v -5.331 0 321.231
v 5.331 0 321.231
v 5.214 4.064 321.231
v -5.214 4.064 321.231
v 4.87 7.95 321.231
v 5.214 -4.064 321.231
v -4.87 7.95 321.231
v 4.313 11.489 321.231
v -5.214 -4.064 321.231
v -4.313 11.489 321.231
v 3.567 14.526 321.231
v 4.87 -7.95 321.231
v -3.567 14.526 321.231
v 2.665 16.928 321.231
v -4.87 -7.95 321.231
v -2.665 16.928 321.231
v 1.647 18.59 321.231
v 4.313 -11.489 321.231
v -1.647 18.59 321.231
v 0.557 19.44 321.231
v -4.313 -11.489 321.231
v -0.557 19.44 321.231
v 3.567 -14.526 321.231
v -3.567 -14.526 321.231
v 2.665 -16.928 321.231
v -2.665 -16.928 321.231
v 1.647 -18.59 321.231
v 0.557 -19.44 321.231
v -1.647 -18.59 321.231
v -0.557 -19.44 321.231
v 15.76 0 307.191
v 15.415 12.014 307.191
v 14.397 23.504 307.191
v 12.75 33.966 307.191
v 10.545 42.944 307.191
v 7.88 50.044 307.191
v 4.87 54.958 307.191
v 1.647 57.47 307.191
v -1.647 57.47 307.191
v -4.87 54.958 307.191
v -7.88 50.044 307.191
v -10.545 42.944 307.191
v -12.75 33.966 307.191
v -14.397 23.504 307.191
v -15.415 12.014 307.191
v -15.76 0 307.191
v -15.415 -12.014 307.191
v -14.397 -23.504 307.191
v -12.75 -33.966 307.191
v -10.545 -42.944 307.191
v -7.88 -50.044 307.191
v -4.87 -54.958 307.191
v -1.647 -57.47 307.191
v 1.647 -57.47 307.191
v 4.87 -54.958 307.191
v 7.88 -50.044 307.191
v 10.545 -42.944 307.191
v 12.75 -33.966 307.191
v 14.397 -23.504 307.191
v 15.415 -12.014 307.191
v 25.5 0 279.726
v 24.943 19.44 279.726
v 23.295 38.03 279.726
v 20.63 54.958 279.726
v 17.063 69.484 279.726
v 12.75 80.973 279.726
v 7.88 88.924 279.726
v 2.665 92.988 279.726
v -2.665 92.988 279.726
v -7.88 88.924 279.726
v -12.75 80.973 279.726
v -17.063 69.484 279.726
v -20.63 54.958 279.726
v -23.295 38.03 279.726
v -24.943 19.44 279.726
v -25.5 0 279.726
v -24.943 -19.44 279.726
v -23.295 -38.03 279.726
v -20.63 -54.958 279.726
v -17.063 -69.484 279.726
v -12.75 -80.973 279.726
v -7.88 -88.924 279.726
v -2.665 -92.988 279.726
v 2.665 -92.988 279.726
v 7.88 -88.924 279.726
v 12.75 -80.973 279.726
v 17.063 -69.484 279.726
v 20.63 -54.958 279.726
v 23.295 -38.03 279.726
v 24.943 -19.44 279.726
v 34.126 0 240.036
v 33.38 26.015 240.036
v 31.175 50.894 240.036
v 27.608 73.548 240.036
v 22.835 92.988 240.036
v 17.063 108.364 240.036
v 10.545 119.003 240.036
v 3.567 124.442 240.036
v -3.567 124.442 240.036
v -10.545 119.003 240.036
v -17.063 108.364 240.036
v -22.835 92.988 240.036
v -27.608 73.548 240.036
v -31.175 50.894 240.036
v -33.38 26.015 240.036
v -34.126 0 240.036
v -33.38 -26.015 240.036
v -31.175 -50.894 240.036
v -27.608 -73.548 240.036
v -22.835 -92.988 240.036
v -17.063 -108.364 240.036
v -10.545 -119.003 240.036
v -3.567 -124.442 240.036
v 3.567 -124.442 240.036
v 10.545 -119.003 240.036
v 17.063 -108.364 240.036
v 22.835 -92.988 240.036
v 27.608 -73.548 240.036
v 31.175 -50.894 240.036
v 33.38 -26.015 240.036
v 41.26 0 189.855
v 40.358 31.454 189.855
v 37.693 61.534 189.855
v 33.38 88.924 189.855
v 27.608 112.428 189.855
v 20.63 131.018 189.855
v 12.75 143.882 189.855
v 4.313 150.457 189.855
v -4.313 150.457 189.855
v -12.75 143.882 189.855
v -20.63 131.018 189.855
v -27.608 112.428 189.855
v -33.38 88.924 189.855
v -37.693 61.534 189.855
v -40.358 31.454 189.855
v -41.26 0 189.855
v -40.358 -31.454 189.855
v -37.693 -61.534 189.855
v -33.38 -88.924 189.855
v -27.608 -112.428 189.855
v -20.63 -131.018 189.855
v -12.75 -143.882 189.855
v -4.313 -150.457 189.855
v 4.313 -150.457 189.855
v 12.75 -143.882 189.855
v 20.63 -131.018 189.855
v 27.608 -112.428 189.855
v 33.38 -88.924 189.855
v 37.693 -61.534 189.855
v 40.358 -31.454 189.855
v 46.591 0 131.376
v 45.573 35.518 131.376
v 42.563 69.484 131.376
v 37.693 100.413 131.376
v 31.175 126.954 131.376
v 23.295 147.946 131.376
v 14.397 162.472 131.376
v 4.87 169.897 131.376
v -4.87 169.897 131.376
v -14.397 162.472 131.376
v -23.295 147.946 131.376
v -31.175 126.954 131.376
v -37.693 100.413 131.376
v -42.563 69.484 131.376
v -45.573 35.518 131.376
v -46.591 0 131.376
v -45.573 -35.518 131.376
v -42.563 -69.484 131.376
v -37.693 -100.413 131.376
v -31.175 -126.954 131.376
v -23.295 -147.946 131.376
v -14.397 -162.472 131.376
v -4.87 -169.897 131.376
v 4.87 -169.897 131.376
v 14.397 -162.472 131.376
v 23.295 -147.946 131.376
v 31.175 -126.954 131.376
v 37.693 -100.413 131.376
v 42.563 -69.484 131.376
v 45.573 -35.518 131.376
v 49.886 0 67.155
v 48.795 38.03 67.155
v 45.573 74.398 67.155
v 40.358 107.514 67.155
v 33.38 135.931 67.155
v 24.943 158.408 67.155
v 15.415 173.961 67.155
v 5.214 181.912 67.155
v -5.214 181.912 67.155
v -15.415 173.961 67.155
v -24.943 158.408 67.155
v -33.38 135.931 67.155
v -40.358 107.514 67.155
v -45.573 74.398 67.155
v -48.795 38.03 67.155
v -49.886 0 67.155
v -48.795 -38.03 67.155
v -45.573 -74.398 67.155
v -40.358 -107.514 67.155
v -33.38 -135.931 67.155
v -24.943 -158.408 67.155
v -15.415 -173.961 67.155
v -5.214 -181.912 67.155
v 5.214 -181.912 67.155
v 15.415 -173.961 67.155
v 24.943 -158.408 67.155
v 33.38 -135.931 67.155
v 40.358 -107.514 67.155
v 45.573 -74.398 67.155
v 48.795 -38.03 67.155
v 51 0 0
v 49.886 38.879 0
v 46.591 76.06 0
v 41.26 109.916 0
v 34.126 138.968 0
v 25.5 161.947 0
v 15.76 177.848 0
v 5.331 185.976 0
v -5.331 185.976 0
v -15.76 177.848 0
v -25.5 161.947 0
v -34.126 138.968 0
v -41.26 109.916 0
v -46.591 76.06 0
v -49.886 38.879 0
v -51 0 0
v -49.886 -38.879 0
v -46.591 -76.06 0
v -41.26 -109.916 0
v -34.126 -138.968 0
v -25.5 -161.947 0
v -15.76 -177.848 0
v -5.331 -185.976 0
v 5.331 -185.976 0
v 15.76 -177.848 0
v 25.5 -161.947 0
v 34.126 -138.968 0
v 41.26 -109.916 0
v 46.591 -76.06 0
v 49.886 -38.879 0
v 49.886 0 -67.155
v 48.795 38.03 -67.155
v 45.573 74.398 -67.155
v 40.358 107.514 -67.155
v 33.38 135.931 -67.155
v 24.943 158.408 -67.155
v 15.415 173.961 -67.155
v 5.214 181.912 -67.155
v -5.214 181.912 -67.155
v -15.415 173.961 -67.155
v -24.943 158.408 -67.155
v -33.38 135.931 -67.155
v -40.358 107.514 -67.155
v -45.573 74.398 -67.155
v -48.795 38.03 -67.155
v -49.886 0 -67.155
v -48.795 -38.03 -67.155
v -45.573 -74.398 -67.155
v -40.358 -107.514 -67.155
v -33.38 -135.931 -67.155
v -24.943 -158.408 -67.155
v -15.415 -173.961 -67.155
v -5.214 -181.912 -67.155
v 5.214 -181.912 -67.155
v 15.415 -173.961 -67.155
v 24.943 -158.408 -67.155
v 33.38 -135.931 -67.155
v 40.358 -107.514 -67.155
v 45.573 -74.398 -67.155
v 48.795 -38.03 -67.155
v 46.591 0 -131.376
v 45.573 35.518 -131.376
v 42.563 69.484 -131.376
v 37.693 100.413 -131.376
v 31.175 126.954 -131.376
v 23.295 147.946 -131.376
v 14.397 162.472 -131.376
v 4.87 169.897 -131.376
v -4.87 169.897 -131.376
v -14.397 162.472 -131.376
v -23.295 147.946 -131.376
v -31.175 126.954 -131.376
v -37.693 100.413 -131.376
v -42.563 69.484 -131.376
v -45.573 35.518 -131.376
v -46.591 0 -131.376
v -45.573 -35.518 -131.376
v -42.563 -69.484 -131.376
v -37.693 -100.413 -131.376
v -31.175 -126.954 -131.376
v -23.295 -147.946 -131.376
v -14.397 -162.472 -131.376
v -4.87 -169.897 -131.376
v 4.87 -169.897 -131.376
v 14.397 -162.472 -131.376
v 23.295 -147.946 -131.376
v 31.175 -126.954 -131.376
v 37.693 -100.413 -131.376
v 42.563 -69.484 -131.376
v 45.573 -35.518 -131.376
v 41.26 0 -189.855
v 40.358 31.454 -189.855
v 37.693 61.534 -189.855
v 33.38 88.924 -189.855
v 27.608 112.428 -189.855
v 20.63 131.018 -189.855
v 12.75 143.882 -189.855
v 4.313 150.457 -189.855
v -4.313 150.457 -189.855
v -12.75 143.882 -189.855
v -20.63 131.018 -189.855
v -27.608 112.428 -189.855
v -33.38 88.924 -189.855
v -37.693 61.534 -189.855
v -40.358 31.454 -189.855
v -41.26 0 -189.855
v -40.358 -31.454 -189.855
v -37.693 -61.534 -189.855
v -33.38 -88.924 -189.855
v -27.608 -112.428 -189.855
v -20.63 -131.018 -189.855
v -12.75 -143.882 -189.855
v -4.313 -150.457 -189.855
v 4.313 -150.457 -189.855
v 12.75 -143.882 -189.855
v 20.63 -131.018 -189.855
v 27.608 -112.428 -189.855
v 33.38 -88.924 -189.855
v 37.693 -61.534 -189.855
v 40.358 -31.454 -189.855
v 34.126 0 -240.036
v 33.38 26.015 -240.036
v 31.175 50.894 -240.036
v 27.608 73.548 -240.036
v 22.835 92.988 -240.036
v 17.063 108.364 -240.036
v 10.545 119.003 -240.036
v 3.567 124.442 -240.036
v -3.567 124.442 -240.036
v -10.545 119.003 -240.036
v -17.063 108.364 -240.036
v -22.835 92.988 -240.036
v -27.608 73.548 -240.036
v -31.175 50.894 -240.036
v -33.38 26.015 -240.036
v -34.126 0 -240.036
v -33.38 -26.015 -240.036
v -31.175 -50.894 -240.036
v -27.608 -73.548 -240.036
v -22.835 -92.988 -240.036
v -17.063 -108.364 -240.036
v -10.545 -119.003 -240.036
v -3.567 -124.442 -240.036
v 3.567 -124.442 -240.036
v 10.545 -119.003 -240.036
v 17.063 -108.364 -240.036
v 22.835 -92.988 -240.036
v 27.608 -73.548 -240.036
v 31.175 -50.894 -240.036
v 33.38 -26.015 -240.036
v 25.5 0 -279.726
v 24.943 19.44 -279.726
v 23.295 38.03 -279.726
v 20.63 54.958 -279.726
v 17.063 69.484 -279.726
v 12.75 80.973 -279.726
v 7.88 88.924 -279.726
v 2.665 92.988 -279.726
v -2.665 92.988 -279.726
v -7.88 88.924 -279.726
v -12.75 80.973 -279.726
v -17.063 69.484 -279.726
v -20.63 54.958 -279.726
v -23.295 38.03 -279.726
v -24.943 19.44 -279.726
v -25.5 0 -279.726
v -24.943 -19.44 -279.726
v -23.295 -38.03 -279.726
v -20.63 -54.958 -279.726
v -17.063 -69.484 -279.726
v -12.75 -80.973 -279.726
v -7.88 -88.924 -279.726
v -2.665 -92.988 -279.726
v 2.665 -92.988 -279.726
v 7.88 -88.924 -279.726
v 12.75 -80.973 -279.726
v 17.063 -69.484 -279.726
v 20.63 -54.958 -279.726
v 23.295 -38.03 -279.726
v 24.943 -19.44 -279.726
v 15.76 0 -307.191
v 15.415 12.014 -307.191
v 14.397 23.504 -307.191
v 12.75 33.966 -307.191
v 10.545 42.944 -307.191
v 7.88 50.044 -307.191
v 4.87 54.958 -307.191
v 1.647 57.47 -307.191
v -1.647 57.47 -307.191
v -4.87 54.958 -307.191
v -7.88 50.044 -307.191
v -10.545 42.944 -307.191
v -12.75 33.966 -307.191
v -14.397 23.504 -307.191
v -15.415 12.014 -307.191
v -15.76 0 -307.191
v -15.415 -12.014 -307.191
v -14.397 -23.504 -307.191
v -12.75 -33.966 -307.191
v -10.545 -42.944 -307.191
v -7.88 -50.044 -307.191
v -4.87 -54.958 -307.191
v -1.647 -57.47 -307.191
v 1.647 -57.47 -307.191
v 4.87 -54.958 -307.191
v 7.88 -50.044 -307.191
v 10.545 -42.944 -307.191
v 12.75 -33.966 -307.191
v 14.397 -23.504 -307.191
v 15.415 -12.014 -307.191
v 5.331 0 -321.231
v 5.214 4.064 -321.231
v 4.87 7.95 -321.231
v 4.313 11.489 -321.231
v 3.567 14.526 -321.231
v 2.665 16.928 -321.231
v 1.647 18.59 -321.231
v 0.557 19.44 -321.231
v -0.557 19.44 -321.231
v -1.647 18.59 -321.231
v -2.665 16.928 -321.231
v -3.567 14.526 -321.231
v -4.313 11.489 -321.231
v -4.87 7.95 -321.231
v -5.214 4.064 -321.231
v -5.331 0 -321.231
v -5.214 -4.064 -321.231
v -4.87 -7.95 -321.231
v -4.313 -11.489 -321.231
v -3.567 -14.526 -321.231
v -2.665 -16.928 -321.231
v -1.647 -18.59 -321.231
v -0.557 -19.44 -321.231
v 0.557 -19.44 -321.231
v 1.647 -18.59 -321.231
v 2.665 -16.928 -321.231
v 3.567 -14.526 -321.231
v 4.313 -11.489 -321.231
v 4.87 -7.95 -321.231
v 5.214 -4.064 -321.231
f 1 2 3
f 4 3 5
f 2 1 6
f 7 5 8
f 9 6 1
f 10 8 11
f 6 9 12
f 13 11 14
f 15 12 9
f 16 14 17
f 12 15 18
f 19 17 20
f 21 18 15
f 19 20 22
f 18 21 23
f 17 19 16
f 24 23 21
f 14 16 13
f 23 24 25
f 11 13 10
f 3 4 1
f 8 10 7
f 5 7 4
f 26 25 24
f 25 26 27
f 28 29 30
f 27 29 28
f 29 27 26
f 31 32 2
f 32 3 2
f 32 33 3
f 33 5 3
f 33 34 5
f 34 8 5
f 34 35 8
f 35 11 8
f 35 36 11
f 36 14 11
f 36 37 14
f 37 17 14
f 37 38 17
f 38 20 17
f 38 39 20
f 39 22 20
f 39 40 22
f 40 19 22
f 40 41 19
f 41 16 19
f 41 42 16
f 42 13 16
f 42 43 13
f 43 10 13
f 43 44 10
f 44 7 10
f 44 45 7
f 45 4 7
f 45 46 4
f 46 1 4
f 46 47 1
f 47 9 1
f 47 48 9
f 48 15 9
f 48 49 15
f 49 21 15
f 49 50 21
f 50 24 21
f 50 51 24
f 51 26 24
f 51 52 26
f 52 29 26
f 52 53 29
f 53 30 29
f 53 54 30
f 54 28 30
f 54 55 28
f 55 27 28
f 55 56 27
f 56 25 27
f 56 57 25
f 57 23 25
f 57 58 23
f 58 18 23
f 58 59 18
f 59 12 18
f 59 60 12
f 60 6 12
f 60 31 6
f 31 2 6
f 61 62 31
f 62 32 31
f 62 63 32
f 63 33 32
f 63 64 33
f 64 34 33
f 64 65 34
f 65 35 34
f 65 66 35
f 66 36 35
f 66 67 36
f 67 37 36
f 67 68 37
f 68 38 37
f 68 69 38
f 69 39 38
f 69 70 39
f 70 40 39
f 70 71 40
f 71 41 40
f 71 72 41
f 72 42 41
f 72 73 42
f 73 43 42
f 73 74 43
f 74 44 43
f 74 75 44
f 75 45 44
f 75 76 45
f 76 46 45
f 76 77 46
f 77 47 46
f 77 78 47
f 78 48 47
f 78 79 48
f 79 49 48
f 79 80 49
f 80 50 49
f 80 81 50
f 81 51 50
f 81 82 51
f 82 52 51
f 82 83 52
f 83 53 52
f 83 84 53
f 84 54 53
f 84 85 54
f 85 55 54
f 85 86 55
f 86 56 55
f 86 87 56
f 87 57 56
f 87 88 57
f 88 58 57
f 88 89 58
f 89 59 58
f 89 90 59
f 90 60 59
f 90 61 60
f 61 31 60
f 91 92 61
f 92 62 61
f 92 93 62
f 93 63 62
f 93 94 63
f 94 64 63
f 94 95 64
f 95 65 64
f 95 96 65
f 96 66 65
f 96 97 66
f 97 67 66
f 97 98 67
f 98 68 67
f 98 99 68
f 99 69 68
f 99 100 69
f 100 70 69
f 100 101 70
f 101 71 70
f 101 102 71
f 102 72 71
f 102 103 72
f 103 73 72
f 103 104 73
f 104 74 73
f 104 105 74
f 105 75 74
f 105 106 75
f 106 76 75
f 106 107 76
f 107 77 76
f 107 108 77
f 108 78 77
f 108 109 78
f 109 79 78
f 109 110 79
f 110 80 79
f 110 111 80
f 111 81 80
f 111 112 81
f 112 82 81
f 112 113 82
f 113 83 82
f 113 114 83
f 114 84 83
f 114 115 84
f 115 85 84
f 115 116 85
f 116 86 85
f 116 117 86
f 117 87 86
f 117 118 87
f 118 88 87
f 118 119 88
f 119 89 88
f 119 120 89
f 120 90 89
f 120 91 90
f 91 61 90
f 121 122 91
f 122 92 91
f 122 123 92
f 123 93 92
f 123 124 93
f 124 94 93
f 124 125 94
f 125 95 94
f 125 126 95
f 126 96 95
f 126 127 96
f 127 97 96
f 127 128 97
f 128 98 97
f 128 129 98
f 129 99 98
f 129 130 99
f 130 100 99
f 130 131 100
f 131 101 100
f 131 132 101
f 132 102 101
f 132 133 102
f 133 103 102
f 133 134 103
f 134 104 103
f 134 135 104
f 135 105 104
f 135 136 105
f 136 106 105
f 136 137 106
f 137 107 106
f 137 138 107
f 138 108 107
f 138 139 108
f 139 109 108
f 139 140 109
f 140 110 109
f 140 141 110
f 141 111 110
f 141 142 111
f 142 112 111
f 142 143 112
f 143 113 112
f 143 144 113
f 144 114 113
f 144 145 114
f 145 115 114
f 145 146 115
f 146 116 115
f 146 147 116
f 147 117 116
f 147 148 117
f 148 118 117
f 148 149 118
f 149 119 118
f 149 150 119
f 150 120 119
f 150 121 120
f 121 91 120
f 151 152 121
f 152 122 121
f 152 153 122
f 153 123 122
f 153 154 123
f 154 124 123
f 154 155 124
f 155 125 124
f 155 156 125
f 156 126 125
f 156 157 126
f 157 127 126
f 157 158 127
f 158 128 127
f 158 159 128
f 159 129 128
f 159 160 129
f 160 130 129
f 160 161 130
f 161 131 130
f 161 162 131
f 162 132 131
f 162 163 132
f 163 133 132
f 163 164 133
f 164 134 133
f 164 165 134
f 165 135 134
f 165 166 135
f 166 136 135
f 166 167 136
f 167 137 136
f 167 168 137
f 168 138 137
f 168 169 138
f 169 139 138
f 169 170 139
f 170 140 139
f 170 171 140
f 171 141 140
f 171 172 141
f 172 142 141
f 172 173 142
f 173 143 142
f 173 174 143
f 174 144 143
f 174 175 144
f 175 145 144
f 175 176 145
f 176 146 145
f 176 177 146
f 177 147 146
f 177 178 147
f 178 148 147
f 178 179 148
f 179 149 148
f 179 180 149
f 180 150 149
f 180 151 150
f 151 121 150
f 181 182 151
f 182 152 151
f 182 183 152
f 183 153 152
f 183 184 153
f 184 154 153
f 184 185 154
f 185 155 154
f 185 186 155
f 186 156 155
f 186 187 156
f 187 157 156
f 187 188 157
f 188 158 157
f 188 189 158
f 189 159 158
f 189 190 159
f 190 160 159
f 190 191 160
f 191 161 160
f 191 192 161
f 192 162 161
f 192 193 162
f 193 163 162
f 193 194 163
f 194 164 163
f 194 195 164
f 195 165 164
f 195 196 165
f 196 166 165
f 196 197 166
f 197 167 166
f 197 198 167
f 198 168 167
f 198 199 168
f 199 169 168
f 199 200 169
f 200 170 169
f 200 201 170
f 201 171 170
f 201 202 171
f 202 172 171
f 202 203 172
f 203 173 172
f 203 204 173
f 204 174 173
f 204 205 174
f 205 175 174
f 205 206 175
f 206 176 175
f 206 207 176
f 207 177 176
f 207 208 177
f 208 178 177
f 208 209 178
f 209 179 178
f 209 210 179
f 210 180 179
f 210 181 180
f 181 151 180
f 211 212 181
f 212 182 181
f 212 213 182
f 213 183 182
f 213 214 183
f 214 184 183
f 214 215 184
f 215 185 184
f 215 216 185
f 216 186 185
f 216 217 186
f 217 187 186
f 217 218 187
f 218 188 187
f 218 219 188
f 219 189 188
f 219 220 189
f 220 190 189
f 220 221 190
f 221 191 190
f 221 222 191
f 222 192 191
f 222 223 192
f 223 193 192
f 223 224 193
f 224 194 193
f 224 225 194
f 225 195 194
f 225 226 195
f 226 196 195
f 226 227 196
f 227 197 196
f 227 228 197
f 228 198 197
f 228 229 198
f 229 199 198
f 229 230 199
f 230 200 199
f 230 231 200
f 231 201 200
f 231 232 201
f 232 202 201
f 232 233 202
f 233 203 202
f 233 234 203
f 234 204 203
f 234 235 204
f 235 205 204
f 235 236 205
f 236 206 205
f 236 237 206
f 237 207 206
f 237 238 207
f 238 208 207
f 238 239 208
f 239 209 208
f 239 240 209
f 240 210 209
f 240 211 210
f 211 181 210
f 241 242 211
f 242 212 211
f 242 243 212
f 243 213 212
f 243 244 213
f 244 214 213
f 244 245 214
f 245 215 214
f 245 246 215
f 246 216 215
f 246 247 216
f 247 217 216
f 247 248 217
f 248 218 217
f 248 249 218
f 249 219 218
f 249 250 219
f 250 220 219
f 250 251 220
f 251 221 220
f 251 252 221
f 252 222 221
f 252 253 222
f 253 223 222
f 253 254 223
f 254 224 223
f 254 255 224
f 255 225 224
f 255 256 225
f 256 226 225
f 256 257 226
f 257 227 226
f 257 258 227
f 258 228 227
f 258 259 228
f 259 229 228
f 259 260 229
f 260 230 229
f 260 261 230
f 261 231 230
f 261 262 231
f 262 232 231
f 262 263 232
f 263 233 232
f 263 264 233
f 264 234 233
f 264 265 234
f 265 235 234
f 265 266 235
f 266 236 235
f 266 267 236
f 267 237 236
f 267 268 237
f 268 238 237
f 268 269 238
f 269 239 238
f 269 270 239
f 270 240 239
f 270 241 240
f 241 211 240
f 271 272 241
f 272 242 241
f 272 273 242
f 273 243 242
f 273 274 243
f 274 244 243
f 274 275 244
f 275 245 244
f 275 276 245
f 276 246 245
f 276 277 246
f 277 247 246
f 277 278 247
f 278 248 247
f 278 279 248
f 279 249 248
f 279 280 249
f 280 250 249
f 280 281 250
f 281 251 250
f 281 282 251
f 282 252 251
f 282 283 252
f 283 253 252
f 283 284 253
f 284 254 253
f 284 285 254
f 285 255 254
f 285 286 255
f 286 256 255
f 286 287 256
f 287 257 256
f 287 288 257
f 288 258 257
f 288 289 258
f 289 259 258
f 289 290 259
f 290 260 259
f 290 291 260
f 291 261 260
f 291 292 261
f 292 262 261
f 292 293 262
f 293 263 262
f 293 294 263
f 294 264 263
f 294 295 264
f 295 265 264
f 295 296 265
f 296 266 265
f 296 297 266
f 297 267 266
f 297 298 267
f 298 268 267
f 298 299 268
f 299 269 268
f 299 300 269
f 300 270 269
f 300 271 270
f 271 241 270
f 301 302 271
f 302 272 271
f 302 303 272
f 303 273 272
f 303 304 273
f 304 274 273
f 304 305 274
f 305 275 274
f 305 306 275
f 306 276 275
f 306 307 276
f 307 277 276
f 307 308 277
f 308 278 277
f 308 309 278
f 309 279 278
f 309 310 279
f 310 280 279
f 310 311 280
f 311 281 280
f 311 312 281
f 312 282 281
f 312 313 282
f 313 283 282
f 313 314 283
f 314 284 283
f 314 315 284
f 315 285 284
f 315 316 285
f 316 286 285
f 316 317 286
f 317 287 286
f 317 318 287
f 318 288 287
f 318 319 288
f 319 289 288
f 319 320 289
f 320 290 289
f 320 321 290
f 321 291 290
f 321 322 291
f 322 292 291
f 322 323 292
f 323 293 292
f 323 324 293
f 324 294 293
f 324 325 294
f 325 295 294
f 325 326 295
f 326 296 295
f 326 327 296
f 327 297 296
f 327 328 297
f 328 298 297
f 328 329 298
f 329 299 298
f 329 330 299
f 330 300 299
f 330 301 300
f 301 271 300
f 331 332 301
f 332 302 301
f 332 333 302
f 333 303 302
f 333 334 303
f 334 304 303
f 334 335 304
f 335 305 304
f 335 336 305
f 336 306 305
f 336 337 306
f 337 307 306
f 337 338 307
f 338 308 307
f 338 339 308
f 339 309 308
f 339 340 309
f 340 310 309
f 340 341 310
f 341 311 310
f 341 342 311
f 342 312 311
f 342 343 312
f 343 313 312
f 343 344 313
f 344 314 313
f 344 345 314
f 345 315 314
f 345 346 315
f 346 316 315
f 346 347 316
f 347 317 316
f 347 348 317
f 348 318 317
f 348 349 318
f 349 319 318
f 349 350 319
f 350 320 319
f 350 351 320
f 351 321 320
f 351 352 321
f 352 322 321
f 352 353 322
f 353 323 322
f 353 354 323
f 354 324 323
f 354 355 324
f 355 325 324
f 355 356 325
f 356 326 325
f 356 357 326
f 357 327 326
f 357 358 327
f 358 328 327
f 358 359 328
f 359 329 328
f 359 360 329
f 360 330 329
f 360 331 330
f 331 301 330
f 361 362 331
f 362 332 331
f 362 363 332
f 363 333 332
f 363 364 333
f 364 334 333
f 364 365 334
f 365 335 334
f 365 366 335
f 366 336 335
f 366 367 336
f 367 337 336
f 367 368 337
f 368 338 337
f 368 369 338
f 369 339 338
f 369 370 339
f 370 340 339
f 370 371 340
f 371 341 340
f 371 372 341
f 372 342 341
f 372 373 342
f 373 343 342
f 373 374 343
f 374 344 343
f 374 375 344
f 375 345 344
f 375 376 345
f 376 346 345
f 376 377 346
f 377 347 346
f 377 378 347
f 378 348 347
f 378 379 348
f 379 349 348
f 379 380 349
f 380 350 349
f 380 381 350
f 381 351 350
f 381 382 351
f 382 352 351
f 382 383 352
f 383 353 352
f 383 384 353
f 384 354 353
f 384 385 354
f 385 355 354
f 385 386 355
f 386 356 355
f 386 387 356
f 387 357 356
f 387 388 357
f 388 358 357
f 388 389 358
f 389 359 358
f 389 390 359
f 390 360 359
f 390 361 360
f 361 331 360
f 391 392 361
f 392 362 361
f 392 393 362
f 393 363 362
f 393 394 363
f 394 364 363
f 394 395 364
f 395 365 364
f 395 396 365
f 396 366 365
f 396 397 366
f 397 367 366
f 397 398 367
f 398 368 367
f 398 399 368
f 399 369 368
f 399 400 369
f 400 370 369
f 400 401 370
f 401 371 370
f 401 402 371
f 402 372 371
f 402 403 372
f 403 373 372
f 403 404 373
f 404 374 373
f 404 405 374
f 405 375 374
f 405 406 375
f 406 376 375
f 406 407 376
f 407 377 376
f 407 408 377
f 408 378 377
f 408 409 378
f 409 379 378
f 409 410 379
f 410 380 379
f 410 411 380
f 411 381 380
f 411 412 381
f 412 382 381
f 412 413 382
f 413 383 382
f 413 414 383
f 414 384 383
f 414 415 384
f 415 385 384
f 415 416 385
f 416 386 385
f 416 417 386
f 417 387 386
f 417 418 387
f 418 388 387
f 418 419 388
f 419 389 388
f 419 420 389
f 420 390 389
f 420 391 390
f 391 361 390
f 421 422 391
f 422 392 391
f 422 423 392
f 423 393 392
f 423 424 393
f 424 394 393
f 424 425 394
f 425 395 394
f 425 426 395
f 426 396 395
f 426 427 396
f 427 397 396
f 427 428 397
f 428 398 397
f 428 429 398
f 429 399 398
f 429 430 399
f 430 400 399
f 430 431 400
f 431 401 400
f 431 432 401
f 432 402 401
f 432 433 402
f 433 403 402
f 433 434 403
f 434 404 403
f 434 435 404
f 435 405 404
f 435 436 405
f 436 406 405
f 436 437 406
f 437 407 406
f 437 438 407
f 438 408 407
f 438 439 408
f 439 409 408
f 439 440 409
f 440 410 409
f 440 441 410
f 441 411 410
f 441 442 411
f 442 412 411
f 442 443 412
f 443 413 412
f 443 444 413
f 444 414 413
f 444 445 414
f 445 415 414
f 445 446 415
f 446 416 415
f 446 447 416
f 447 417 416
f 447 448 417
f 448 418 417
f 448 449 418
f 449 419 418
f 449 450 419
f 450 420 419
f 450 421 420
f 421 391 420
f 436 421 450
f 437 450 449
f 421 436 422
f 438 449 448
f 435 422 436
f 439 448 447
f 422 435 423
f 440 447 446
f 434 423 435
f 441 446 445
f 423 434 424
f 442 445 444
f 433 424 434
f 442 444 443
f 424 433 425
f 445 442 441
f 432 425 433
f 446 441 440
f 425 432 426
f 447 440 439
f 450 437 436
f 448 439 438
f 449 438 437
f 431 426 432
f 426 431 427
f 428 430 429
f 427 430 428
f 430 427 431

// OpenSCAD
// Generated by SolidPython 1.0.1 on 2020-07-29 00:46:45


scale(v = [3, 11, 19]) {
	sphere(r = 17);
}
/***********************************************
*********      SolidPython code:      **********
************************************************
 
# import packages: SolidPython
from solid import *
from solid.utils import *
from itertools import chain, combinations, permutations


class Resize:

    def __init__(self, scad_file):
        self.scad_file = scad_file
        #self.scad_file = import_scad(scad_file)
        # cone/cylinder param:
        self.r1 = 0
        self.r2 = 0
        self.h = 0
        # rectangular prism param:
        self.w = 0
        self.l = 0
        # ellipse param:
        self.r = 0

    # import OpenScad code (file name corresponds to shape)


    # classify shape + parameters
    def assign(self, param1, param2, param3):
        if self.scad_file == 'cone.scad':
            self.r1 = param1
            self.r2 = param2
            self.h = param3
        elif self.scad_file == 'cylinder.scad':
            self.r1 = param1
            self.r2 = param2
            self.h = param3
        elif self.scad_file == 'rectangularPrism.scad':
            self.h = param1
            self.l = param2
            self.w = param3
        else:
            self.r = param1
            self.h = param2

    # resize parameters
    def iterate(self):
        x = range(3, 20, 2)
        i = 1
        if self.scad_file == 'cone.scad':
            tempList = list(permutations(x, 2))
            for temp in tempList:
                param1 = temp[0]
                param2 = temp[1]
                filepath = 'produced_scad_files/' + 'cone' + str(param1) + '_' + str(param2) + '_' + '.scad'
                scad_render_to_file(cylinder(h=param1, r1=param2, r2=0), filepath)

        elif self.scad_file == 'cylinder.scad':
            tempList = list(permutations(x, 3))
            for temp in tempList:
                param1 = temp[0]
                param2 = temp[1]
                filepath = 'produced_scad_files/' + 'cylinder' + str(param1) + '_' + str(param2) + '_' + '.scad'
                scad_render_to_file(cylinder(h=param1, r1=param2, r2=param2), filepath)

        elif self.scad_file == 'rectangularPrism.scad':
            tempList = list(permutations(x, 3))
            for temp in tempList:
                param1 = temp[0]
                param2 = temp[1]
                param3 = temp[2]
                filepath = 'produced_scad_files/' + 'rectangularPrism' + str(param1) + '_' + str(param2) + '_' + str(
                    param3) + '.scad'
                scad_render_to_file(cube(size=(param1, param2, param3)), filepath)

        elif self.scad_file == 'ellipse.scad':
            tempList = list(permutations(x, 4))
            for temp in tempList:
                param1 = temp[0]
                param2 = temp[1]
                param3 = temp[2]
                param4 = temp[3]
                filepath = 'produced_scad_files/' + 'ellipse' + str(param1) + '_' + str(param2) + '_' + str(param3) + '_' + str(param4) + '.scad'
                scad_render_to_file(scale([param1, param2, param3])(sphere(r=param4)), filepath)

    def render_to_scadfile(self):
        scad_render_to_file(scad, 'example.scad') 
 
************************************************/
